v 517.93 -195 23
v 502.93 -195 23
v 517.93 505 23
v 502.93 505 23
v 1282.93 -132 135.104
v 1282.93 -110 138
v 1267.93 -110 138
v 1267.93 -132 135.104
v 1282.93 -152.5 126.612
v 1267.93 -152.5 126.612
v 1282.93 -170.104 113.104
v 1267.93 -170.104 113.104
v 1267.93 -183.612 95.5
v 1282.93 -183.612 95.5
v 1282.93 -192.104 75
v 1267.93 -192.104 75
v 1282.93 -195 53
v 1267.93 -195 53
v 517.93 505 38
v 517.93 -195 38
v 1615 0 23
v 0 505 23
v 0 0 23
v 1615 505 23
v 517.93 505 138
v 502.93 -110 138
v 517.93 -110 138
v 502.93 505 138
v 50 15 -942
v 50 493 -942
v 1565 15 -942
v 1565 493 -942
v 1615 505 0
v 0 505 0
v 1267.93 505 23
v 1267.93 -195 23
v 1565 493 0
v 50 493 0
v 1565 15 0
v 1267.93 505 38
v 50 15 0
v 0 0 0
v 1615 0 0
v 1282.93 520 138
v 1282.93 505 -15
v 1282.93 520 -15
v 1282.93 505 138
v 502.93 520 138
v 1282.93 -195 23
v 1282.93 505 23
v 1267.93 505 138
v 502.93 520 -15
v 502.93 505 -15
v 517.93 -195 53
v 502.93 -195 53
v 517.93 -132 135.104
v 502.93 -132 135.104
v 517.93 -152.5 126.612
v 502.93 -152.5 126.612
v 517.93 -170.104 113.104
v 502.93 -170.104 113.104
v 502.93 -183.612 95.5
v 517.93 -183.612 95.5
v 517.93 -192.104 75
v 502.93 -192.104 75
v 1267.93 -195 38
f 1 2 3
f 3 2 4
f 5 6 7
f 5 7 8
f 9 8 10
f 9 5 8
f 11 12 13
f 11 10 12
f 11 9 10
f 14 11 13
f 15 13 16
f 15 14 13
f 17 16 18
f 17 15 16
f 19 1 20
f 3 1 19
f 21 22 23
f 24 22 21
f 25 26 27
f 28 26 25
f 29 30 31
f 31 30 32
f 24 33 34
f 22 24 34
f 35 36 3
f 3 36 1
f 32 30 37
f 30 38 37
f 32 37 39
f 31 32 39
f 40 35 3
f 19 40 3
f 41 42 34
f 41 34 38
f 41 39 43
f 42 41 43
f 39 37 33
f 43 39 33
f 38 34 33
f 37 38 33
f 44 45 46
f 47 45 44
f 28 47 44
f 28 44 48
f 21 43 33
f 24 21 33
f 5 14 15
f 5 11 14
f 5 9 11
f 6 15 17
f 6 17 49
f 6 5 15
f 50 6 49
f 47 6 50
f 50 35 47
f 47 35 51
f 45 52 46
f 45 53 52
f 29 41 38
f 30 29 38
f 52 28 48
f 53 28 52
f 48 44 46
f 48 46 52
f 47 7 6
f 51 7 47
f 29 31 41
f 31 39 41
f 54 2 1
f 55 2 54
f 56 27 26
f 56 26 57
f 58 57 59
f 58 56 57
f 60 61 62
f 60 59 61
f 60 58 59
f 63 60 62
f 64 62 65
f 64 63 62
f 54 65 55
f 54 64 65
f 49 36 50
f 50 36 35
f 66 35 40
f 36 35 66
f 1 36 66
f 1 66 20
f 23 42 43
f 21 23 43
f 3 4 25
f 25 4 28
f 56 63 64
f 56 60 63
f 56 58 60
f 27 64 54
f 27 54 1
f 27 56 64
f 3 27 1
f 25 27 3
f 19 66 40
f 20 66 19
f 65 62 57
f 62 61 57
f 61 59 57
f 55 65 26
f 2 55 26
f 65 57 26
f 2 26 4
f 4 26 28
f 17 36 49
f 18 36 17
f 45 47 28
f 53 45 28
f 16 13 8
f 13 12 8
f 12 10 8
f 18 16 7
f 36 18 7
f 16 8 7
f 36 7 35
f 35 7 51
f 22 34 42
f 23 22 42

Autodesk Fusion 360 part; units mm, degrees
sketch "Sketch1" plane through (0, 0, 0) normal (0, 0, 1) x (1, 0, 0)
  line L0 (0, 0) -> (1615, 0)
  line L1 (1615, 0) -> (1615, 505)
  line L2 (1615, 505) -> (0, 505)
  line L3 (0, 505) -> (0, 0)
  line L4 (50, 493) -> (1565, 493)
  line L5 (1565, 493) -> (1565, 15)
  line L6 (1565, 15) -> (50, 15)
  line L7 (50, 15) -> (50, 493)
  dimension "d1" = 505
  dimension "d2" = 1615
  dimension "d3" = 12
  dimension "d4" = 50
  dimension "d5" = 50
  dimension "d6" = 15
extrude "Extrude1" add sketch "Sketch1" along normal blind 23 contours L0 L1 L2 L3 | L4 L5 L6 L7 makes body 1
extrude "Extrude2" add sketch "Sketch1" against normal blind 942 contours L4 L5 L6 L7 bodies 1
sketch "Sketch2" plane through (0, 0, 23) normal (0, 0, 1) x (-1, 0, 0)
  line L0 (0, -505) -> (0, 0)
  line L1 (0, 0) -> (-1615, 0)
  line L2 (-1615, 0) -> (-1615, -505)
  line L3 (-1615, -505) -> (0, -505)
  line L4 (-517.9302, -505) -> (-1267.9302, -505)
  line L5 (-1267.9302, -505) -> (-1267.9302, 195)
  line L6 (-1267.9302, 195) -> (-517.9302, 195)
  line L7 (-517.9302, 195) -> (-517.9302, -505)
  line L8 (-1615, -505) -> (0, -505)
  dimension "d11" = 750
  dimension "d12" = 700
extrude "Extrude3" add sketch "Sketch2" along normal blind 15 separate body contours L1 L3 L4 L5 L7 L8 | L1 L5 L6 L7 makes body 2
sketch "Sketch3" plane through (1267.9302, 0, 0) normal (1, 0, 0) x (0, 1, 0)
  line L0 (-195, 23) -> (505, 23)
  line L1 (505, 23) -> (505, 38)
  line L2 (505, 38) -> (-195, 38)
  line L3 (505, 23) -> (-195, 23)
  line L4 (-195, 23) -> (-195, 138)
  line L5 (-195, 138) -> (505, 138)
  line L6 (505, 138) -> (505, 23)
  line L7 (-195, 38) -> (-195, 23)
  dimension "d21" = 700
  dimension "d22" = 115
extrude "Extrude5" add sketch "Sketch3" along normal blind 15 separate body makes body 3
extrude "Extrude6" add sketch "Sketch3" along normal blind 15 from surface at -765 separate body makes body 4
sketch "Sketch6" plane through (0, 505, 0) normal (0, 1, 0) x (-1, 0, 0)
  line L0 (-1615, 0) -> (0, 0)
  line L1 (0, 0) -> (0, 23)
  line L2 (0, 23) -> (-1615, 23)
  line L3 (-1615, 23) -> (-1615, 0)
  line L4 (-1282.9302, 138) -> (-502.9302, 138)
  line L5 (-502.9302, 138) -> (-502.9302, -15)
  line L6 (-502.9302, -15) -> (-1282.9302, -15)
  line L7 (-1282.9302, -15) -> (-1282.9302, 138)
  point P0 (-1282.9302, 138)
  point P1 (-502.9302, 138)
  dimension "d29" = 15
extrude "Extrude7" add sketch "Sketch6" along normal blind 15 separate body contours L0 L2 L5 L7 | L0 L5 L6 L7 | L2 L4 L5 L7 makes body 5
fillet "Fillet1" radius 85 2 edges at (1275.4302, -195, 138) (510.4302, -195, 138) on bodies 3 4
equation "d11 = base_width"
equation "d12 = base_height"
equation "base_width = 750 mm"
equation "base_height = 700 mm"
equation "material_thickness = 15 mm"
equation "d17 = material_thickness"
equation "d21 = base_height"
equation "d22 = base_sidewalls + material_thickness"
equation "base_sidewalls = 100 mm"
equation "d24 = material_thickness"
equation "d26 = -( base_width + material_thickness )"
equation "d27 = material_thickness"
equation "d29 = material_thickness"
equation "d30 = material_thickness"
equation "d33 = base_sidewalls - material_thickness"
